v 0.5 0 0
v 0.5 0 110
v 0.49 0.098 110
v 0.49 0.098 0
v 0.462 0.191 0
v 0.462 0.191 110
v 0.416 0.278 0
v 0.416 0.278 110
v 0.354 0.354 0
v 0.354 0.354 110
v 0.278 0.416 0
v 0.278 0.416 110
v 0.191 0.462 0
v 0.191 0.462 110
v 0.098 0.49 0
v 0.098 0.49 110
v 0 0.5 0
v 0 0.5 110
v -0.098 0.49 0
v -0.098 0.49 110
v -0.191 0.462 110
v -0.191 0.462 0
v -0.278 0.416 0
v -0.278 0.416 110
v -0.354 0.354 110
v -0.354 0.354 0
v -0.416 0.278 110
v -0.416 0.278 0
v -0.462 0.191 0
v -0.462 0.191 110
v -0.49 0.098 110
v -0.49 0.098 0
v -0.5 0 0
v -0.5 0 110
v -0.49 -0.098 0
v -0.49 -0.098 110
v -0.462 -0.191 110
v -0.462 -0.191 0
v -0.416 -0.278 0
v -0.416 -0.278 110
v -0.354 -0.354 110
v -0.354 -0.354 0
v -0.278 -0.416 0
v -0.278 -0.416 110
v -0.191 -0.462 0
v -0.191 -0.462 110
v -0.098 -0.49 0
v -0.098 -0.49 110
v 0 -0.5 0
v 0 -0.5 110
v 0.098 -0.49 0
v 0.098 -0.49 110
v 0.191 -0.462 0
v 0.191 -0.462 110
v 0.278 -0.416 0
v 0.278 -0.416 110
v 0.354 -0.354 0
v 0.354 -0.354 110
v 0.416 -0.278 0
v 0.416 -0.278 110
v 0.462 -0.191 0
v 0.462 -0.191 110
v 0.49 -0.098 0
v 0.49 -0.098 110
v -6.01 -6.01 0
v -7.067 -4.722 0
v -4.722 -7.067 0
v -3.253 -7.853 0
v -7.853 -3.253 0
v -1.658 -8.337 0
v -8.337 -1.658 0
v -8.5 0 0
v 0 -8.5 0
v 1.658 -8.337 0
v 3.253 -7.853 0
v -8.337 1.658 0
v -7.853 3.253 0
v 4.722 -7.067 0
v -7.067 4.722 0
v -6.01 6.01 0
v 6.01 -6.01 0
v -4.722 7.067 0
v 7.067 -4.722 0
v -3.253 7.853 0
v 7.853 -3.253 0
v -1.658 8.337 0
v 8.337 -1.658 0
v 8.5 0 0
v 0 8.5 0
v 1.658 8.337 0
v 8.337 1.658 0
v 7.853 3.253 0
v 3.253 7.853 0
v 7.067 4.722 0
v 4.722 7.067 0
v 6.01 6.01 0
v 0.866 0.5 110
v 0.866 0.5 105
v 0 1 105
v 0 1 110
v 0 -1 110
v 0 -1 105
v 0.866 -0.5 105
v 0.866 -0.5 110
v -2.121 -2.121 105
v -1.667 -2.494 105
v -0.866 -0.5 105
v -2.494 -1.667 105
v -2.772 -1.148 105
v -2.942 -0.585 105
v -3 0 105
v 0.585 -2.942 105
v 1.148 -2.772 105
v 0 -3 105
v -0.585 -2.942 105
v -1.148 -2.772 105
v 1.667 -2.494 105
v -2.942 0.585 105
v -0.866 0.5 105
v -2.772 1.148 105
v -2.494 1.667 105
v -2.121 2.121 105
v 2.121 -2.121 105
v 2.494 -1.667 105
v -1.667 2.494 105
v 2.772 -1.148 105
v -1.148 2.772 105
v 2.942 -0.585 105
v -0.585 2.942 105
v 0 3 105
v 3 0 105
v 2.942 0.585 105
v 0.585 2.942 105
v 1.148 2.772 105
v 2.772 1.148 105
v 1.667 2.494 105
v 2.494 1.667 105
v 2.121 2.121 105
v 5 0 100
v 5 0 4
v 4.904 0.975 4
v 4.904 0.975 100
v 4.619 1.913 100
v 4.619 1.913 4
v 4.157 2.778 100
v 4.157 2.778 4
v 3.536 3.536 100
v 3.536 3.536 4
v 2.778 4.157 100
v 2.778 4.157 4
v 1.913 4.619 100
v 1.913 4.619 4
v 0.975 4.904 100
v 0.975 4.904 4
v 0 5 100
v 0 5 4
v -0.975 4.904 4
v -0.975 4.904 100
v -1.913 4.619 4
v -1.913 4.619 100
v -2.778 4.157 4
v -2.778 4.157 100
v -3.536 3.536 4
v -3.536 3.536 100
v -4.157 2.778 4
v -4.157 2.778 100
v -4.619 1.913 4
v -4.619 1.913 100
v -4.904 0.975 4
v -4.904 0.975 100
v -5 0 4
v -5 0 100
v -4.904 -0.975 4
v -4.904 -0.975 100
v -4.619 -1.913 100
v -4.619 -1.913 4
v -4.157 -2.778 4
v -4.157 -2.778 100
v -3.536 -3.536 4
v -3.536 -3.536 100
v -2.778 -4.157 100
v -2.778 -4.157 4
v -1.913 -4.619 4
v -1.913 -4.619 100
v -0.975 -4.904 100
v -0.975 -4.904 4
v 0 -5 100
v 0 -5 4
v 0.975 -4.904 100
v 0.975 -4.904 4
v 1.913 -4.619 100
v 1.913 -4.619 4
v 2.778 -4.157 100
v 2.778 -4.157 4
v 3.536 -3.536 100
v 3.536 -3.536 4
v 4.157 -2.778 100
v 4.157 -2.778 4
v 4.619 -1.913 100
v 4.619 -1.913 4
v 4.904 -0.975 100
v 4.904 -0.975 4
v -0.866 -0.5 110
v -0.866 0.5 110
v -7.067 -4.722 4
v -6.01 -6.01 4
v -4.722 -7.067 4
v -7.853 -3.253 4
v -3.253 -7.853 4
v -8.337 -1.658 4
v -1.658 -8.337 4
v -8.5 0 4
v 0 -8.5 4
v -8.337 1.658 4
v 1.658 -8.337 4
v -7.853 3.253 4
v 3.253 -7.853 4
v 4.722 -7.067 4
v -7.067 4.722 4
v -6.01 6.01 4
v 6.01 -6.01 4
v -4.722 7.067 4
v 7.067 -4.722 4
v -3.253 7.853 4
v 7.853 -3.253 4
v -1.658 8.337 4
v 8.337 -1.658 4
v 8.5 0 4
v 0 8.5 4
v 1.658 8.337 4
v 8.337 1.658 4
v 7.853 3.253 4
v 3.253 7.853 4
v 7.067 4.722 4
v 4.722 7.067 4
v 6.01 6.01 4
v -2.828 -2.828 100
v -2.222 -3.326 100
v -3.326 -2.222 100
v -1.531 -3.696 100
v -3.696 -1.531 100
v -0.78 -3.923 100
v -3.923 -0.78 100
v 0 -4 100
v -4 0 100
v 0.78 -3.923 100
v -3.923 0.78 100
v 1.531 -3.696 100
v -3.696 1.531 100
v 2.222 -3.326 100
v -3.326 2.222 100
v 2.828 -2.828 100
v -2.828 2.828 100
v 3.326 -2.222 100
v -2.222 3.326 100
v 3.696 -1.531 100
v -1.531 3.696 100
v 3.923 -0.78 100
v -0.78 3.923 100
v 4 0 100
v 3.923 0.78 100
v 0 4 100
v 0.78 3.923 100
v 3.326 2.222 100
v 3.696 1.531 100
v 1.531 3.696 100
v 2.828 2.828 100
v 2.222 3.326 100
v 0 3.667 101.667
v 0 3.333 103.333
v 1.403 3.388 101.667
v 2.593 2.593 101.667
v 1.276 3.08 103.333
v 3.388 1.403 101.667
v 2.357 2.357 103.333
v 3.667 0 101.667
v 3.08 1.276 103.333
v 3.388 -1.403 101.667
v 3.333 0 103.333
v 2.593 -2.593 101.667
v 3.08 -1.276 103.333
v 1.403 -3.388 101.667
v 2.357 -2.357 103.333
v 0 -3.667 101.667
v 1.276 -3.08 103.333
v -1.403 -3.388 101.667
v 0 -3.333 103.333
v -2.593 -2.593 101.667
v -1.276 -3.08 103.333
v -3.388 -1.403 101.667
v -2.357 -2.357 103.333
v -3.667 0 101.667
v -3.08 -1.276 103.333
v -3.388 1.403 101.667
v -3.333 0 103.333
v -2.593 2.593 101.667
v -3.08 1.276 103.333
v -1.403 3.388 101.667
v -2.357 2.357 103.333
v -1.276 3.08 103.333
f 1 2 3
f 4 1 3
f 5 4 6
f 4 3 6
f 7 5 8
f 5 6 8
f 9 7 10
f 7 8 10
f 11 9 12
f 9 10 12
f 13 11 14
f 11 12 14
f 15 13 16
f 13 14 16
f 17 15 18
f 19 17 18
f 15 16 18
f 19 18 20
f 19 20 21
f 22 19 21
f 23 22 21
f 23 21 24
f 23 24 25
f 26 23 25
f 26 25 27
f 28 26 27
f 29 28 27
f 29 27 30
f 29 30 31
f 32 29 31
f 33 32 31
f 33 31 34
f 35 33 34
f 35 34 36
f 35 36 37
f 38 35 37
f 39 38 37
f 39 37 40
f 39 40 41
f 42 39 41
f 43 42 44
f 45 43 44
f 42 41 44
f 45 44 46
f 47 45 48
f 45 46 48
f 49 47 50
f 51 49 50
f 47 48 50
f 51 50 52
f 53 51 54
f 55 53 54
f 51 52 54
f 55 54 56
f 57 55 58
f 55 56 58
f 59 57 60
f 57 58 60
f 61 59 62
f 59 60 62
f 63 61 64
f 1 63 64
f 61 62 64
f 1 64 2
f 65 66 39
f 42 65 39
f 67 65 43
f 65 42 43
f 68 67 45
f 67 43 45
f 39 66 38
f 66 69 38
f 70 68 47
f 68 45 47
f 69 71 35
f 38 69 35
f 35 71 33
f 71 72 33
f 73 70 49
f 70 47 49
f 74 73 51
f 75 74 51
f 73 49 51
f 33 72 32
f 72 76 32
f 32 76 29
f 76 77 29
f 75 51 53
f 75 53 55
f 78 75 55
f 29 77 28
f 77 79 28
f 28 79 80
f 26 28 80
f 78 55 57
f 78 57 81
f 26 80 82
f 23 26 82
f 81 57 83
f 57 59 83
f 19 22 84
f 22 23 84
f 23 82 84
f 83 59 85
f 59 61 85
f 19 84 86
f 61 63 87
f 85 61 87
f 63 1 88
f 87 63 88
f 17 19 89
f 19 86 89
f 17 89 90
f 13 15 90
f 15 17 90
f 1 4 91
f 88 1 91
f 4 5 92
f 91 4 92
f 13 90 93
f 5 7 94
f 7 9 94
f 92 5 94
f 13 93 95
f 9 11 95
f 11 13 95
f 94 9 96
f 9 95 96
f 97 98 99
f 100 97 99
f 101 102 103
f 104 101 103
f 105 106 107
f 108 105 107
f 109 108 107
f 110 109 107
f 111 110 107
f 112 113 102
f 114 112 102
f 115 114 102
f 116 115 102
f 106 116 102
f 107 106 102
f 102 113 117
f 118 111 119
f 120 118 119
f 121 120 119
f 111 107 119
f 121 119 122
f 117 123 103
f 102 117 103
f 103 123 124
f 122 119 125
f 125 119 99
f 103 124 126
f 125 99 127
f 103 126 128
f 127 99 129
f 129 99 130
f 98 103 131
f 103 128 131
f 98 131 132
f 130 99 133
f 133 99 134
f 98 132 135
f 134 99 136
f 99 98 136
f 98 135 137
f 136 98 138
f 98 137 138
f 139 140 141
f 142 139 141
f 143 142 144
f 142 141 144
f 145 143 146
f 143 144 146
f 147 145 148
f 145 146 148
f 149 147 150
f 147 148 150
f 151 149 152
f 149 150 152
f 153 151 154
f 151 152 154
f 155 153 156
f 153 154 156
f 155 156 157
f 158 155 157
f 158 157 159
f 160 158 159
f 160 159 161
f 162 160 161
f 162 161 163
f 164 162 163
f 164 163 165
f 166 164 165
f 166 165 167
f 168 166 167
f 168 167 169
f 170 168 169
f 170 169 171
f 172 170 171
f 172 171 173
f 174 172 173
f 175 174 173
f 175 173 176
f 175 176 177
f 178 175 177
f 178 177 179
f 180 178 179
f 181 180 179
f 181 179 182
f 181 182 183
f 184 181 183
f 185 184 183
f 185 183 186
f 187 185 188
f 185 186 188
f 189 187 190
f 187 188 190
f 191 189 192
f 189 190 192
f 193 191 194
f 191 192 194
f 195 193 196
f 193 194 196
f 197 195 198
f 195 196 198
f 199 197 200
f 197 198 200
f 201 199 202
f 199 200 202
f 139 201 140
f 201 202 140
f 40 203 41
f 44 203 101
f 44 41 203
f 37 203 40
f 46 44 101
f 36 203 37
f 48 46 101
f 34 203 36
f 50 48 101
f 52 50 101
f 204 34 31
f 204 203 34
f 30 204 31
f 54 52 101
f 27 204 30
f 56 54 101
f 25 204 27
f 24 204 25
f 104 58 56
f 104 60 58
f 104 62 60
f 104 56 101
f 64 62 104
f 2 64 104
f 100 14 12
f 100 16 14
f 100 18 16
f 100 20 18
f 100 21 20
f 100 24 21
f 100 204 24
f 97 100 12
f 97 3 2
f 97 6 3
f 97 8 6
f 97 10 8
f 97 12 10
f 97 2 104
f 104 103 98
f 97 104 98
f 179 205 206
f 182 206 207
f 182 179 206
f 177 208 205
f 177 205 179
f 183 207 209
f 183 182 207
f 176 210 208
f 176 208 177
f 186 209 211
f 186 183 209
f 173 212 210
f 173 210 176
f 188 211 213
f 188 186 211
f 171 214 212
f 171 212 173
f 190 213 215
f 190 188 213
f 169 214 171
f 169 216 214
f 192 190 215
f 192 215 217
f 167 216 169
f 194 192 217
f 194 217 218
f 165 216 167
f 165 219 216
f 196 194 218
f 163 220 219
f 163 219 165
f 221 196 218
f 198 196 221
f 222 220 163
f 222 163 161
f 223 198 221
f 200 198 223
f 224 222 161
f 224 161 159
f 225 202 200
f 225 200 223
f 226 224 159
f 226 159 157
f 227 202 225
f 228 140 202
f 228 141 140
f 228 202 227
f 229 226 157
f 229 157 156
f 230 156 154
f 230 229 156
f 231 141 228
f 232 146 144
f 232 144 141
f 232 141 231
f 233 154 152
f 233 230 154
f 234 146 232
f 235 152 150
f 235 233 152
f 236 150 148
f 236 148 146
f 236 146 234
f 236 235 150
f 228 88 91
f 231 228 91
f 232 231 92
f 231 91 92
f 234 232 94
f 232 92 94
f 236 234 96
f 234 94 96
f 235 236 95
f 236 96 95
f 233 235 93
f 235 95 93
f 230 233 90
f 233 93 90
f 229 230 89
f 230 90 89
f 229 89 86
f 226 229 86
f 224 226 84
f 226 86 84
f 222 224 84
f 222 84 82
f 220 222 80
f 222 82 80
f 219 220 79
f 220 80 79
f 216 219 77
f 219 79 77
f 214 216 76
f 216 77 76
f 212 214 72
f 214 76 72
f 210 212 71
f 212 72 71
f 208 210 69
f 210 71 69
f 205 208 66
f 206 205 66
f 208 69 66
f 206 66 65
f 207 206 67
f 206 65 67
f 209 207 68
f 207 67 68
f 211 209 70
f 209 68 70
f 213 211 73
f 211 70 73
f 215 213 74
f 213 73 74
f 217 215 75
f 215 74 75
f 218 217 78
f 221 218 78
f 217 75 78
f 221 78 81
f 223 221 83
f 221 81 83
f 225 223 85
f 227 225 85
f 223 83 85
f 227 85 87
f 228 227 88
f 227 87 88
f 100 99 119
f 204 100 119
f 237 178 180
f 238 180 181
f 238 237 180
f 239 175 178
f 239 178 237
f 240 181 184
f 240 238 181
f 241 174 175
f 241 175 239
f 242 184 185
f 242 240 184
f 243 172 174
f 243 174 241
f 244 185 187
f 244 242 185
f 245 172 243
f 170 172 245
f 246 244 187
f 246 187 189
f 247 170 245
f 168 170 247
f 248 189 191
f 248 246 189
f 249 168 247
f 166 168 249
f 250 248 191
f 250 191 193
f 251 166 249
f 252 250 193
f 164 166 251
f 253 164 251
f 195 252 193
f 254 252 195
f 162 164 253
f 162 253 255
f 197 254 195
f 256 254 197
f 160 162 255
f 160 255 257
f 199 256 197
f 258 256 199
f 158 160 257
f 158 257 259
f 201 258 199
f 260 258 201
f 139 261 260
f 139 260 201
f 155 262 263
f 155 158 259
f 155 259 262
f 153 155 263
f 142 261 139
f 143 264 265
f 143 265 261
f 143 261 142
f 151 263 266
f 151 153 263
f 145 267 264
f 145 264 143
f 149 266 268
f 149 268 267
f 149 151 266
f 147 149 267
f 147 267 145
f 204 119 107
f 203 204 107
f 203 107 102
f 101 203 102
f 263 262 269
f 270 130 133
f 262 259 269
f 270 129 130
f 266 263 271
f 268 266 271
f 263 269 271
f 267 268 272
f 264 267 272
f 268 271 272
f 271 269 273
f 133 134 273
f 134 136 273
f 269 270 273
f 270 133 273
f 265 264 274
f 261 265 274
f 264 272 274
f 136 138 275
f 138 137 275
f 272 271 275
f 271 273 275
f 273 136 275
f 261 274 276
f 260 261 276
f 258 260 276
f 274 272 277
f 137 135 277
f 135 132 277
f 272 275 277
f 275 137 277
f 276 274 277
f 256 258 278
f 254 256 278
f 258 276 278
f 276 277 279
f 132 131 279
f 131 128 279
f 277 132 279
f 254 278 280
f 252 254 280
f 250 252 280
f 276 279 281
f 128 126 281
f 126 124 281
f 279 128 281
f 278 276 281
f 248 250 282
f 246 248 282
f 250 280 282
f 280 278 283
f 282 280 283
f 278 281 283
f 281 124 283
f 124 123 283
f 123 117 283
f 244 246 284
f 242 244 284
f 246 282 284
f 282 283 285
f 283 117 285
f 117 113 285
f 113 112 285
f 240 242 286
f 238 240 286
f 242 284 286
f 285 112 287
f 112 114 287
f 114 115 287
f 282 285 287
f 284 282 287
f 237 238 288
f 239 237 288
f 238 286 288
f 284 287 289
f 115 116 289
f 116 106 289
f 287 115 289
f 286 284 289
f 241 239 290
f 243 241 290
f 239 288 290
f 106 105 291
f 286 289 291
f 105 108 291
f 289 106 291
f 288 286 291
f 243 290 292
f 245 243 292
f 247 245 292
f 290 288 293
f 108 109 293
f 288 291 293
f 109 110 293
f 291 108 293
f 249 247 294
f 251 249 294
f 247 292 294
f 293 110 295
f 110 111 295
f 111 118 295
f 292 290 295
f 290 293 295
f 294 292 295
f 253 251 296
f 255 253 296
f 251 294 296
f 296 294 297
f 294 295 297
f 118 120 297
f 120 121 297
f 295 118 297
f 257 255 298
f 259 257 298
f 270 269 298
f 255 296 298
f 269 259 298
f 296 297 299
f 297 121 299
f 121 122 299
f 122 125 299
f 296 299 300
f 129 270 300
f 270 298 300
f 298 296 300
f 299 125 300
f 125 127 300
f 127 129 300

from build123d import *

# Parameters (mm, degrees)
F0_R     = 8.5
F1_DEPTH = 4
F2_R     = 5
F3_DEPTH = 100
F7_DEPTH = 5
F8_R     = 0.5
F9_DEPTH = 120


with BuildPart() as f1:
    # F0 (on Top) → F1 (new body)
    with BuildSketch(Plane.XY):
        Circle(F0_R)
    extrude(amount=F1_DEPTH)

    # F2 (on Top) → F3 (join)
    with BuildSketch(Plane.XY):
        Circle(F2_R)
    extrude(amount=F3_DEPTH)

    # F4 (on Right) → F5 (revolve)
    with BuildSketch(Plane.YZ):
        Polygon((3, 105), (0, 105), (0, 100), (4, 100), align=None)
    revolve(axis=Axis((0, 0, 102.5), (0, 0, -1)))

    # F6 (on face) → F7 (join)
    with BuildSketch(Plane.XY.offset(105)):
        Polygon((0.866025, -0.5), (0.866025, 0.5), (0, 1), (-0.866025, 0.5), (-0.866025, -0.5), (0, -1), align=None)
    extrude(amount=F7_DEPTH)

    # F8 (on face) → F9 (cut)
    with BuildSketch(Plane.XY.offset(110)):
        Circle(F8_R)
    extrude(amount=-F9_DEPTH, mode=Mode.SUBTRACT)


solid = f1.part
